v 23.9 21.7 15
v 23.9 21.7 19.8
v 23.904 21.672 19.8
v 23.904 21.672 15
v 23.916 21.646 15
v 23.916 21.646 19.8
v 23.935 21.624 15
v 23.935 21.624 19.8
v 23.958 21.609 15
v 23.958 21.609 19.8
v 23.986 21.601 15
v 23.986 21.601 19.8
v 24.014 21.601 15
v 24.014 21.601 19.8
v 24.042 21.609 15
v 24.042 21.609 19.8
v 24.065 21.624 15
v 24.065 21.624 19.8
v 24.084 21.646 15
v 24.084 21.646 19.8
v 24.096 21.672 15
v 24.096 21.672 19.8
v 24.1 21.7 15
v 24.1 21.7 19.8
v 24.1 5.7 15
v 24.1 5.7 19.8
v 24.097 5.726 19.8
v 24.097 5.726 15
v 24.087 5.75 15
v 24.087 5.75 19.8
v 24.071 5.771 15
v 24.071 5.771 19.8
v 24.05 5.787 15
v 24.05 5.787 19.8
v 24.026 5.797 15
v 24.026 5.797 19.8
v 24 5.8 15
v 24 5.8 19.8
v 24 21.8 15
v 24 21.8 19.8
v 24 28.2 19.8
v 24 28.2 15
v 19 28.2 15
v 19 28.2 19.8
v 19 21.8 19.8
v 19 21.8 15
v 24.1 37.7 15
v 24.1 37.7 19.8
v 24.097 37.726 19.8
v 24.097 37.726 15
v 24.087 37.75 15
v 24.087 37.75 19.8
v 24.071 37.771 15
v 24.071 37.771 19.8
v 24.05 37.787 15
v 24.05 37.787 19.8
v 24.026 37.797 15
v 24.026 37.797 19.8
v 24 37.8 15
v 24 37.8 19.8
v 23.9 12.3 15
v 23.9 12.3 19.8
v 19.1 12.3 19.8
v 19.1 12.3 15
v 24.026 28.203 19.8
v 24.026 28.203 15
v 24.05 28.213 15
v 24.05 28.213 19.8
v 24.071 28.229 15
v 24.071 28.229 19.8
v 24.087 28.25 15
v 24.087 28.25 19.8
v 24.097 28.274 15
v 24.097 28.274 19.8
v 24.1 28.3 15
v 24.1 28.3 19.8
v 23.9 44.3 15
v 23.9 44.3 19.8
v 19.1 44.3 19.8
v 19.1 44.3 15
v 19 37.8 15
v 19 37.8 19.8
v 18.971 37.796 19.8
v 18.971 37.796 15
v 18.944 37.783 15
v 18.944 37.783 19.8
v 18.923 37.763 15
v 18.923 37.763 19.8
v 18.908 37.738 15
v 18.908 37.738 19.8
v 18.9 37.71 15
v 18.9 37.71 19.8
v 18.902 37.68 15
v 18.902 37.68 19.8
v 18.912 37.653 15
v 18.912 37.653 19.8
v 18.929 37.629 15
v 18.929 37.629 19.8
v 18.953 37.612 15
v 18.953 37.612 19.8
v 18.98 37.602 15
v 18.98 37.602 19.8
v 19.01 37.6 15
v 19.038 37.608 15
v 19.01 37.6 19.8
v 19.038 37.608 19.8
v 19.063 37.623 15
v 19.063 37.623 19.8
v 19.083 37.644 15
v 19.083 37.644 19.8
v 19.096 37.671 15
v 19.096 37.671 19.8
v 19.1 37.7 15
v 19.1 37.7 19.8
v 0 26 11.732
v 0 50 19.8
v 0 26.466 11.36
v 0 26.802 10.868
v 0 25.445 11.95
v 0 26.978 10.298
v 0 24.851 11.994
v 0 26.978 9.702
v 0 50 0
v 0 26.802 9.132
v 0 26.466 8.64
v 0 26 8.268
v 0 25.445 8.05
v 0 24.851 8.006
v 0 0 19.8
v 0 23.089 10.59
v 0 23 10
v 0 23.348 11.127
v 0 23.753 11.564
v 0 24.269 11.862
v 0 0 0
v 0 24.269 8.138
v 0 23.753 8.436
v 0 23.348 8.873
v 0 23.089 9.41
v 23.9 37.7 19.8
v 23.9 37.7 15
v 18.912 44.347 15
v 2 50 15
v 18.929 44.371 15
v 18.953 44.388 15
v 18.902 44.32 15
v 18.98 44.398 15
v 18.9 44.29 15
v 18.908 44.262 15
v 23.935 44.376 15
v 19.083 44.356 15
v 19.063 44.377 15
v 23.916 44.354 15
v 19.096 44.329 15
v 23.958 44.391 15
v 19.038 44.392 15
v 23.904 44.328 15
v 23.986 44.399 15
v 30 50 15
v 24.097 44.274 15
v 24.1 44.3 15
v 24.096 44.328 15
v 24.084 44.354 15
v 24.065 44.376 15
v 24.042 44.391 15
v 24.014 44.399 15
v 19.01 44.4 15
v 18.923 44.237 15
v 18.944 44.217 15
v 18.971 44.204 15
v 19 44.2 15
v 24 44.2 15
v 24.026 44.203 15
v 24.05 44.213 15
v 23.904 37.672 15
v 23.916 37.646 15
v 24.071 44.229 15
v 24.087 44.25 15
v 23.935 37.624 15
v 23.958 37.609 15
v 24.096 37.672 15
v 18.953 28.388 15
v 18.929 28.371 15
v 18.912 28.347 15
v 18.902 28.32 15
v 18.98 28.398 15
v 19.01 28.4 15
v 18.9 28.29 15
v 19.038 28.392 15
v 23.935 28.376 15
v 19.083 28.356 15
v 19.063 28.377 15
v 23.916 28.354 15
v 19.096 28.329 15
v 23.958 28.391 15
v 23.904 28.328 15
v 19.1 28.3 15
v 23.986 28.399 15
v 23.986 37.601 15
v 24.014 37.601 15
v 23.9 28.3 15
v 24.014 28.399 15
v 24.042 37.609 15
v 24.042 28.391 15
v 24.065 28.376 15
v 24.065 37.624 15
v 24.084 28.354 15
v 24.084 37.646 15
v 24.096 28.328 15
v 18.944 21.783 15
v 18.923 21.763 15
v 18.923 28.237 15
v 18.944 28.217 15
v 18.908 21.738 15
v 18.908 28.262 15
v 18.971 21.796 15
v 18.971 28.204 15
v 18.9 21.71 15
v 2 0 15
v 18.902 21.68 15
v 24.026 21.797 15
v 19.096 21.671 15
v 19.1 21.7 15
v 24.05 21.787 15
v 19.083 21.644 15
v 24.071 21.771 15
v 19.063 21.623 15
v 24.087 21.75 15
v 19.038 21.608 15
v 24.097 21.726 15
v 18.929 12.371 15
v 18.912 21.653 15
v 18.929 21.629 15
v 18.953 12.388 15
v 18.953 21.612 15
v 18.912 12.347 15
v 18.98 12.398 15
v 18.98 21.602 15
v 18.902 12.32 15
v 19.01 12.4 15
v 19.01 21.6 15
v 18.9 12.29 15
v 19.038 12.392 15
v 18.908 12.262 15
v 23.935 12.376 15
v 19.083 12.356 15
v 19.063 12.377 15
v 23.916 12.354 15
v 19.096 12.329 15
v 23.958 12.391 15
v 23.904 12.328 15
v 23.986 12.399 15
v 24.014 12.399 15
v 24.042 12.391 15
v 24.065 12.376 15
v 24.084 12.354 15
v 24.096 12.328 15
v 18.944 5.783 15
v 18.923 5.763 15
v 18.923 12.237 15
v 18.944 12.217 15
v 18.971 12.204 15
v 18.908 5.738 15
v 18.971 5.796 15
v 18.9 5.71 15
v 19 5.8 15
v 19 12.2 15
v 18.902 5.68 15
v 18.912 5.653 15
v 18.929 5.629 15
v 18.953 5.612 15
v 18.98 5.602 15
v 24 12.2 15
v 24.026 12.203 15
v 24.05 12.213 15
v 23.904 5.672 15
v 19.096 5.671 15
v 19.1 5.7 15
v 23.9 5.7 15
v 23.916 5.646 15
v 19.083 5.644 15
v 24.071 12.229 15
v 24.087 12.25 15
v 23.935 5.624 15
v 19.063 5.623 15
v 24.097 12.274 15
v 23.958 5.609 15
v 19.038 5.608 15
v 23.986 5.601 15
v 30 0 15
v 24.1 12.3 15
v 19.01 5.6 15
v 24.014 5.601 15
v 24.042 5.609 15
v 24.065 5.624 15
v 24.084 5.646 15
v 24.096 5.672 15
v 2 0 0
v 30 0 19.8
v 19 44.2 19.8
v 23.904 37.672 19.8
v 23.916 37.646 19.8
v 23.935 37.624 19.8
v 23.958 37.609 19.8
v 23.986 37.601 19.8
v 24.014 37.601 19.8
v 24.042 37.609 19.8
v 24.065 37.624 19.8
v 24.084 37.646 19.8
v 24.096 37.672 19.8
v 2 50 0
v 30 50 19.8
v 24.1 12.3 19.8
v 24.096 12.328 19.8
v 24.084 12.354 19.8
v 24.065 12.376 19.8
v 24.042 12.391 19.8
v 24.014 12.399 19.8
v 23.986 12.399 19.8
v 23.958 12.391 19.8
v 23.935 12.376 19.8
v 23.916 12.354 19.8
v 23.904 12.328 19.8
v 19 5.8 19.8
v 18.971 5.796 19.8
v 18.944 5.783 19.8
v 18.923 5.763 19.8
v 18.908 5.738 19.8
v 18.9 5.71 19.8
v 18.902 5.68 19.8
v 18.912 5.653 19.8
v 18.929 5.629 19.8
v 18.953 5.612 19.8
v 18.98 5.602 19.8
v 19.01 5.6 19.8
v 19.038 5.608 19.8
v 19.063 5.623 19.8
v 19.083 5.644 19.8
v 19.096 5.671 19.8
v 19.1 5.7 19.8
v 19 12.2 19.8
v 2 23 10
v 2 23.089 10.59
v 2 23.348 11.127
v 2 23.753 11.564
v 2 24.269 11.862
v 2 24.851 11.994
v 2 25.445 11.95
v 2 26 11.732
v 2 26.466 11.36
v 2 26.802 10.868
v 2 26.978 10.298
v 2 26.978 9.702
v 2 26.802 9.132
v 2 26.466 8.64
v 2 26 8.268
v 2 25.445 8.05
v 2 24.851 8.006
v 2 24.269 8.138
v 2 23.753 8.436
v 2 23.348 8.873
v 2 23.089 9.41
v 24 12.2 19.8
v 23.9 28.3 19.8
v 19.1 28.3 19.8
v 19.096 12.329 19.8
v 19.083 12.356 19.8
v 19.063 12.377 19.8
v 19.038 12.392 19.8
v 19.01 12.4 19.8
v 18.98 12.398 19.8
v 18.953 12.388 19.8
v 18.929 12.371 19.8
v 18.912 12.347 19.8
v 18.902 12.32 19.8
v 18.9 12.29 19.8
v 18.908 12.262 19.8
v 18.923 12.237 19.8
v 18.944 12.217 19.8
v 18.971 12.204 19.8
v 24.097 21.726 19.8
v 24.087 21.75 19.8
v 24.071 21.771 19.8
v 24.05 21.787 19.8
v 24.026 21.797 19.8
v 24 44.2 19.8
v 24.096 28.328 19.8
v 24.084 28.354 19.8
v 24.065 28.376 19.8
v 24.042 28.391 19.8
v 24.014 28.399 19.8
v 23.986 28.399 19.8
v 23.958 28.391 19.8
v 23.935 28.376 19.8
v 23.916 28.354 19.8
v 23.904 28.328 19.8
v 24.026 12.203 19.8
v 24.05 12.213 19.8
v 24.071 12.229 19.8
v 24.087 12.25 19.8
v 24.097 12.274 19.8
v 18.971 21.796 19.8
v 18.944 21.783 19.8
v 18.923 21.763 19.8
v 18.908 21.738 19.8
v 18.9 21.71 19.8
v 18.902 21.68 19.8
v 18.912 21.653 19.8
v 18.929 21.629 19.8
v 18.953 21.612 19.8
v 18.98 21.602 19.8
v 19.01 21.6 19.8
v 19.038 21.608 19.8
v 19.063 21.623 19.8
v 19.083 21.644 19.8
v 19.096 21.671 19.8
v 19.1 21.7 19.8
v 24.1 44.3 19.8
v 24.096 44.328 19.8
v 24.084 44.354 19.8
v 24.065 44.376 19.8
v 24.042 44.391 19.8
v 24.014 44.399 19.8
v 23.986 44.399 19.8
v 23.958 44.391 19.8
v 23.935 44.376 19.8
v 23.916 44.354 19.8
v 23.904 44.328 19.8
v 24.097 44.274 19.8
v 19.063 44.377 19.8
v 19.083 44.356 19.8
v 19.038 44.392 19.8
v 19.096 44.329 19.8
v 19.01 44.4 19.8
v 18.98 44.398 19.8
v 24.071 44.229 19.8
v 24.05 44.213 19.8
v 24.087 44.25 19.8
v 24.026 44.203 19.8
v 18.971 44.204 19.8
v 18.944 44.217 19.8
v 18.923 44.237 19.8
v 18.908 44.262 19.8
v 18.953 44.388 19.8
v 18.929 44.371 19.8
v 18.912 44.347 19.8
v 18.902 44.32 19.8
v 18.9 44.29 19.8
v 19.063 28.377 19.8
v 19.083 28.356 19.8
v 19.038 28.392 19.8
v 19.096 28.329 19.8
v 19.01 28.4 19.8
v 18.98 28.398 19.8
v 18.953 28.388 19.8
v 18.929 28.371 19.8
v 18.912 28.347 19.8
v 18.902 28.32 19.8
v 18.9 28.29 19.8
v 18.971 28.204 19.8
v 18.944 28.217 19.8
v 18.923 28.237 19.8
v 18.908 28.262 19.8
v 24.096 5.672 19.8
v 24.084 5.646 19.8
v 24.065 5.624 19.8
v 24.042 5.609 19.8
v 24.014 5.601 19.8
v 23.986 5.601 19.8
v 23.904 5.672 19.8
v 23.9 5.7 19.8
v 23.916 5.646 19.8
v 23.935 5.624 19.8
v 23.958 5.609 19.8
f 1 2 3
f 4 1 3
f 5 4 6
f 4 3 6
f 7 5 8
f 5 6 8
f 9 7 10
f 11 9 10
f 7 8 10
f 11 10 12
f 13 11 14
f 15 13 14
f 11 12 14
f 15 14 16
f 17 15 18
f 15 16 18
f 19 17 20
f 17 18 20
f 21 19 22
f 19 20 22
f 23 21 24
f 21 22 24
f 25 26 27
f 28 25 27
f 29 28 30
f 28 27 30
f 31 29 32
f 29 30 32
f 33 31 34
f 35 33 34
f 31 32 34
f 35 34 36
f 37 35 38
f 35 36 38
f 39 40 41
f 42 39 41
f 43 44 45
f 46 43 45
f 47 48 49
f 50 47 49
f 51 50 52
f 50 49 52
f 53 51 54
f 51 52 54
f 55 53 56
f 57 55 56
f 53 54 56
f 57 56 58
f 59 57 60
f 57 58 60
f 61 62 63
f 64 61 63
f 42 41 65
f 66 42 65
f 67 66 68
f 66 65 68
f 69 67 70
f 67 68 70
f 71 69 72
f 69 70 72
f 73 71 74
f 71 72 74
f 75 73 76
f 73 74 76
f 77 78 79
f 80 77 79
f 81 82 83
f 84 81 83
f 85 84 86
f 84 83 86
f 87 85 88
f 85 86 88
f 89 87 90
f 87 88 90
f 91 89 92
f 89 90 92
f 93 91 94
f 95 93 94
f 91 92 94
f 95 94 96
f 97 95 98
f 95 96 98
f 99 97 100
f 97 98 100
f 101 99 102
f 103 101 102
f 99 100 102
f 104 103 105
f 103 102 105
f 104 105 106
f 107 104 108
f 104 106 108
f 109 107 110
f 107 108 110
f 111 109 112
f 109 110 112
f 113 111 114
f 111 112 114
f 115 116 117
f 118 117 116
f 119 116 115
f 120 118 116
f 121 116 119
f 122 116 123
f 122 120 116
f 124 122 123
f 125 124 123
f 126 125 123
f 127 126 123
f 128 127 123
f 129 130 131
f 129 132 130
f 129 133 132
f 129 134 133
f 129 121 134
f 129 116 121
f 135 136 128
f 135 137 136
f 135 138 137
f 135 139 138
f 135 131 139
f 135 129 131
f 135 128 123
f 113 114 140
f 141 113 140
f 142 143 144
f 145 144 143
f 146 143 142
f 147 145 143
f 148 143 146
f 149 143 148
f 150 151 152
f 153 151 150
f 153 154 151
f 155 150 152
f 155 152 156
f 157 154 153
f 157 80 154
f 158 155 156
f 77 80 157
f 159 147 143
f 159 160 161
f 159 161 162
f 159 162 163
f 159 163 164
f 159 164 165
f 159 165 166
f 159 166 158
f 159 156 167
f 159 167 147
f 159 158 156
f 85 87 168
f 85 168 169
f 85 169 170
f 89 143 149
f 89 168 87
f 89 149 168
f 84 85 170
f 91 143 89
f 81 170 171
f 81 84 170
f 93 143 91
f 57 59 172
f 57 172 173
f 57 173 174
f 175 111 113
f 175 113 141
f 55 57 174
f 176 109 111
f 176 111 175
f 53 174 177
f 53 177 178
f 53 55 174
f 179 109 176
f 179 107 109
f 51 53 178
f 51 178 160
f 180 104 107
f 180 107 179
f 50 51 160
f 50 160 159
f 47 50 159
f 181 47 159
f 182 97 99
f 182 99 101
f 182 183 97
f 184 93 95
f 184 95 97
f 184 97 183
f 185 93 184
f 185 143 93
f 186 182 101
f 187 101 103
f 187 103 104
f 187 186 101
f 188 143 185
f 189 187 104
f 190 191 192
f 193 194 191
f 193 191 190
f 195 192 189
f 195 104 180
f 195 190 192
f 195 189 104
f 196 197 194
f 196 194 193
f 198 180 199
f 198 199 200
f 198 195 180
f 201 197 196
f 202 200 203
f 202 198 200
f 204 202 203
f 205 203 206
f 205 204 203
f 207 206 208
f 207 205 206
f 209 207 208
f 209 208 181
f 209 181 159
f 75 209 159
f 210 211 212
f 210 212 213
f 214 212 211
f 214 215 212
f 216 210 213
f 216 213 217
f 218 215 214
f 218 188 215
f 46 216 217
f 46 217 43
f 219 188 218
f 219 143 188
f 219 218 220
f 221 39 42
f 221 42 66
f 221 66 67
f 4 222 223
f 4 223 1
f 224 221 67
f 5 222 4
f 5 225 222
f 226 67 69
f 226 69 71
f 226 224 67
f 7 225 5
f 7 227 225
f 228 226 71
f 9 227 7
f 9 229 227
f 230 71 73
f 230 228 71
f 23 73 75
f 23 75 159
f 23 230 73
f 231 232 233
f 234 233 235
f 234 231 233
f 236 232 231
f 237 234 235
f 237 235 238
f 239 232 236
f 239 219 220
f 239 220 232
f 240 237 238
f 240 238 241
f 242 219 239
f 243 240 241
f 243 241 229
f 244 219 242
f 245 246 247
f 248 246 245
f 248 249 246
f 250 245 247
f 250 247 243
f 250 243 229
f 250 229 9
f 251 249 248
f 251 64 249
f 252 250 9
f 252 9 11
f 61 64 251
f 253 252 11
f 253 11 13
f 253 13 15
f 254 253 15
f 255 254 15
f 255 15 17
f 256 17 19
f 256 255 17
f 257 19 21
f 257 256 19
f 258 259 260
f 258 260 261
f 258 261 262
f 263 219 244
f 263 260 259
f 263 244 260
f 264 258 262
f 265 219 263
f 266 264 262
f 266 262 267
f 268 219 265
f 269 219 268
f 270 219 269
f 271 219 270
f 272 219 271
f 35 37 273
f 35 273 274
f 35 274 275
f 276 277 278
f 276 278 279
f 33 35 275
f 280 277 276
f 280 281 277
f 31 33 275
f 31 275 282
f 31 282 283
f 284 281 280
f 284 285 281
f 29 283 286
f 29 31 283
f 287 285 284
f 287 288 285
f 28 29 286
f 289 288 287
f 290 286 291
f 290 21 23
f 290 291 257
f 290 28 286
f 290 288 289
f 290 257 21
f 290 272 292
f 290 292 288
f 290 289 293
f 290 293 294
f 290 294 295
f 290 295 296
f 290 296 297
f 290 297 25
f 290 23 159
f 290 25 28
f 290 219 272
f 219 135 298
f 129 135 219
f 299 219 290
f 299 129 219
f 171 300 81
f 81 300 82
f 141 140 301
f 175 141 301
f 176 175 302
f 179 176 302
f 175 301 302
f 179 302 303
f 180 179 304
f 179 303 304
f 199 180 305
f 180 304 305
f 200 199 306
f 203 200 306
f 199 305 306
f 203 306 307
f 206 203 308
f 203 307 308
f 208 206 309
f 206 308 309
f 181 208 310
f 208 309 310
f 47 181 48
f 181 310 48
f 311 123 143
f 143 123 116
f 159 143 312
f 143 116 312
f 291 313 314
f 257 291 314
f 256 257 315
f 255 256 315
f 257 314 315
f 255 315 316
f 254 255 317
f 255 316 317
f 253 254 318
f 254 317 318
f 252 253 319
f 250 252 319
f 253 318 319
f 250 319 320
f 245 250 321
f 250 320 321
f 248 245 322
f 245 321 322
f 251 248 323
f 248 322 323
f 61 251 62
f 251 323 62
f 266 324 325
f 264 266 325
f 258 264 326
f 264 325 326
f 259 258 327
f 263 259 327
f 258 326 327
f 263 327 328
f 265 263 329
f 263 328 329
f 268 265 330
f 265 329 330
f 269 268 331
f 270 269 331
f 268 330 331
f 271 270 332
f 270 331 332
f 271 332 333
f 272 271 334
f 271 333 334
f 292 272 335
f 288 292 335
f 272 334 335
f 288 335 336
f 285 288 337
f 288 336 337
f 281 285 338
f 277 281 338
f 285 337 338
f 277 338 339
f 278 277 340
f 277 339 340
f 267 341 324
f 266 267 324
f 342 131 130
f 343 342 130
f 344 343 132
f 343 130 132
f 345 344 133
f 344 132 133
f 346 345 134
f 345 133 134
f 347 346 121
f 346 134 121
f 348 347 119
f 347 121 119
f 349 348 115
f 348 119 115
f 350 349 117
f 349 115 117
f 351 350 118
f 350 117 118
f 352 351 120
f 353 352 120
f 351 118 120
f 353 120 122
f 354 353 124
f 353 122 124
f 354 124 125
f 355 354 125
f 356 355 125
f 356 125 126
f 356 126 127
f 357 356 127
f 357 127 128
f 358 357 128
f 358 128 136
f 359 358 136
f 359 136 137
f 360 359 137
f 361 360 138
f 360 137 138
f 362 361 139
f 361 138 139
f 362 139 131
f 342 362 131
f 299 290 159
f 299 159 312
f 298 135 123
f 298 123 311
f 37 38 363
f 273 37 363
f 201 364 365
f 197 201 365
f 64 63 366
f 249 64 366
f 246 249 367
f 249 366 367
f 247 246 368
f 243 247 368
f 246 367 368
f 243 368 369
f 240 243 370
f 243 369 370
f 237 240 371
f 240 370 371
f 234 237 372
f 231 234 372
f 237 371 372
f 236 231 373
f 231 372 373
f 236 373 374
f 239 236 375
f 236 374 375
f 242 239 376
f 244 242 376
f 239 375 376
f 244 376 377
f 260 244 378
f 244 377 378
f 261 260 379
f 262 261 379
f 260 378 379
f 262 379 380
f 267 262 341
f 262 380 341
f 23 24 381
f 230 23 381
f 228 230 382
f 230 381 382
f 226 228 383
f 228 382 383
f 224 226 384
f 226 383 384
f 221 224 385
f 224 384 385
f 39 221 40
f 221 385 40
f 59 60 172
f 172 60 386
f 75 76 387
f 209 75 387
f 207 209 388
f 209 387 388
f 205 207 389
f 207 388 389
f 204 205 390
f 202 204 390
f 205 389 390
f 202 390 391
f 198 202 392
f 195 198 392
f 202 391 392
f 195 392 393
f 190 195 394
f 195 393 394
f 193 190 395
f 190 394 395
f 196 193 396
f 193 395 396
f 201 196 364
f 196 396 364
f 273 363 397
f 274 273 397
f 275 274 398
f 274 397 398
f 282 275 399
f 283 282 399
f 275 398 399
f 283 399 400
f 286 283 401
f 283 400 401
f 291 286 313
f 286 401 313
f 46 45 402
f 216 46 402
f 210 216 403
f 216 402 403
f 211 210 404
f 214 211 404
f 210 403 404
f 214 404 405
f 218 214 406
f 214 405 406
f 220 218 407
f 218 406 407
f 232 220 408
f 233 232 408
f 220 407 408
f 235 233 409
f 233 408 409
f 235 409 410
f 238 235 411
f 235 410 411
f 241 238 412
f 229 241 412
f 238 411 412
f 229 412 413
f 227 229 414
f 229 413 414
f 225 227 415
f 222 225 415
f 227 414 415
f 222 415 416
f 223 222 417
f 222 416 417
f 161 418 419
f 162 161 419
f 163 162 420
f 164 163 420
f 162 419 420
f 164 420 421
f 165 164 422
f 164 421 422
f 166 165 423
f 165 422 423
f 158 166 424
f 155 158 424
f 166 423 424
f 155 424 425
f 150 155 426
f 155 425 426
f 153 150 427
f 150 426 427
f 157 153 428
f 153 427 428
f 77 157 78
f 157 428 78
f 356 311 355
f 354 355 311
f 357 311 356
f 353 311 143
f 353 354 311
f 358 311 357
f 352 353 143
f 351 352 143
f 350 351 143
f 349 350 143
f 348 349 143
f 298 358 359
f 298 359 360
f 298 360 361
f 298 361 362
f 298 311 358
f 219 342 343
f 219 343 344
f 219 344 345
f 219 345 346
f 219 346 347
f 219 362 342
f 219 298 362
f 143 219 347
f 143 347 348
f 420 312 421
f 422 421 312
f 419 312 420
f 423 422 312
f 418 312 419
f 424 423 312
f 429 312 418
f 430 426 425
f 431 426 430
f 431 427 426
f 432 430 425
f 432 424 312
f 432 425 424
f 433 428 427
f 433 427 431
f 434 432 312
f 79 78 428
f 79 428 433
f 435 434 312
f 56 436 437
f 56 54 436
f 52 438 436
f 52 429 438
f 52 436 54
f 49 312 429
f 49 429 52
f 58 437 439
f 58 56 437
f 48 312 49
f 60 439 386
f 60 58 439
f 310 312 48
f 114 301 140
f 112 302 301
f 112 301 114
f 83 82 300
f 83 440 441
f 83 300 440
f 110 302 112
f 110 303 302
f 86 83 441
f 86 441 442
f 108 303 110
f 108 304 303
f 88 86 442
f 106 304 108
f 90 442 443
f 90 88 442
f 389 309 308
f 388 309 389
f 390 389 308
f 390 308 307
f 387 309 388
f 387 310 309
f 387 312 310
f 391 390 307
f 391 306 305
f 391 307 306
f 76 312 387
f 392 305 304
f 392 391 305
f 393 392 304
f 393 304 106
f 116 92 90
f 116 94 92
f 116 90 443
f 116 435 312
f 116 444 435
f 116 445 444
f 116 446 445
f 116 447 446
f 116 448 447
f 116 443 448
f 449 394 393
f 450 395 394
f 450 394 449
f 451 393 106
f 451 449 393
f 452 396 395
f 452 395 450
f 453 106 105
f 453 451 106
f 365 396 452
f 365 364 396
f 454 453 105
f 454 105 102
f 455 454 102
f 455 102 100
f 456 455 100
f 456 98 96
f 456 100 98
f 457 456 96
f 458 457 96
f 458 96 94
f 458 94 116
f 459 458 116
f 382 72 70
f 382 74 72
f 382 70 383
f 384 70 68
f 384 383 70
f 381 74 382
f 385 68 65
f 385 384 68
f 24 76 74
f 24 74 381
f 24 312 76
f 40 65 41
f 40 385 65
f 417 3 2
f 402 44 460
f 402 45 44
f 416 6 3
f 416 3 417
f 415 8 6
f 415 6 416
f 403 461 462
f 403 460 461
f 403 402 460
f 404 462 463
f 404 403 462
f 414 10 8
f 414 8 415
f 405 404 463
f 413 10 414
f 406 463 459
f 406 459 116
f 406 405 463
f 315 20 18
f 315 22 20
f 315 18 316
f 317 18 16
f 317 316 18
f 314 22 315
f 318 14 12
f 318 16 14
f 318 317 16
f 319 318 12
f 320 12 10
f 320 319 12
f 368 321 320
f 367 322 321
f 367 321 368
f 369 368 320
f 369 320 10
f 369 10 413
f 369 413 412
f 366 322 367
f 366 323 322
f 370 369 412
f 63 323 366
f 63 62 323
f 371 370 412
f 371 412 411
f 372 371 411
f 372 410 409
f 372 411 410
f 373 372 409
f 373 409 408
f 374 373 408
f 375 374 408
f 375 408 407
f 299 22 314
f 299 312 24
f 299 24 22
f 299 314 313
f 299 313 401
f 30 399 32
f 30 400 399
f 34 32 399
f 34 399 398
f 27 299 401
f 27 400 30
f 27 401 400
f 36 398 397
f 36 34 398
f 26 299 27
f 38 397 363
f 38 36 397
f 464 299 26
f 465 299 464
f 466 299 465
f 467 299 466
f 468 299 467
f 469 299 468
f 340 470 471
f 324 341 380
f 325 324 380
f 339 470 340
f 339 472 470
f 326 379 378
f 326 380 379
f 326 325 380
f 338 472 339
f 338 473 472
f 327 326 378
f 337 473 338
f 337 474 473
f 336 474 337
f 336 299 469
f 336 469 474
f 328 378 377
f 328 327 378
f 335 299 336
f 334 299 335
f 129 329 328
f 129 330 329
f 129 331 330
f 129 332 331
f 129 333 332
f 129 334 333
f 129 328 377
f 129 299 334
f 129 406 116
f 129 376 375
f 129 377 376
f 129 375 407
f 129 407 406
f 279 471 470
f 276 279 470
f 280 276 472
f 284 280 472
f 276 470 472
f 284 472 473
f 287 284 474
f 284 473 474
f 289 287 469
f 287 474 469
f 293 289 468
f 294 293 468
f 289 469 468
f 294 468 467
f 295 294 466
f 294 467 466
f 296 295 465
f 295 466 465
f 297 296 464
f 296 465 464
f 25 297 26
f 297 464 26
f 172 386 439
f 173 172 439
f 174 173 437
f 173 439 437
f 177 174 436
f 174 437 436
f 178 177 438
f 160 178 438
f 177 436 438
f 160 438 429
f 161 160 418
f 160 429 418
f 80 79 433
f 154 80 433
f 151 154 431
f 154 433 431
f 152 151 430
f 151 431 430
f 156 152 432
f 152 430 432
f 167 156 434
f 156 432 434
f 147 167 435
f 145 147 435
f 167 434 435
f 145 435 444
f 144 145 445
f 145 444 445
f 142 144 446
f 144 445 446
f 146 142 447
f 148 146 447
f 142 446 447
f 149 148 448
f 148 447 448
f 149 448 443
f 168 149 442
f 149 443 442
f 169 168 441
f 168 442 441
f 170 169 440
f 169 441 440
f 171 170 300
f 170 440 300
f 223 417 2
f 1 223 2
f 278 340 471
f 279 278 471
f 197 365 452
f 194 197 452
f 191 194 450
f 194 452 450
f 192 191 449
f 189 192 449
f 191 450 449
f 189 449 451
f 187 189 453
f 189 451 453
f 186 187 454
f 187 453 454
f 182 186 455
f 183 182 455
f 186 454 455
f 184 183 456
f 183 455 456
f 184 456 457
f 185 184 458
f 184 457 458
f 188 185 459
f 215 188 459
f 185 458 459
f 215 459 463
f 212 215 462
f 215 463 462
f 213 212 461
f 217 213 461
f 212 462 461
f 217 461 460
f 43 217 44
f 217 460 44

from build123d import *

# Parameters (mm, degrees)
F2_DEPTH = 50
F4_R     = 2
F5_DEPTH = 2
F6_DEPTH = 4.8


with BuildPart() as f2:
    # F1 (on Front) → F2 (new body)
    with BuildSketch(Plane.XZ):
        Polygon((0, 19.8), (0, 0), (2, 0), (2, 15), (30, 15), (30, 19.8), align=None)
    extrude(amount=-F2_DEPTH)

    # F4 (on face) → F5 (cut, through all)
    with BuildSketch(Plane(origin=(0, 0, 0), x_dir=(0, -1, 0), z_dir=(-1, 0, 0))):
        with Locations((-25, 10)):
            Circle(F4_R)
    extrude(amount=-F5_DEPTH, mode=Mode.SUBTRACT)

    # F3 (on face) → F6 (cut, through all)
    with BuildSketch(Plane.XY.offset(19.8)):
        with BuildLine():
            ThreePointArc((19, 21.8), (18.9292893219, 21.6292893219), (19.1, 21.7))
            Line((19.1, 21.7), (19, 21.7))
            Line((19, 21.7), (19, 21.8))
        make_face()
        with BuildLine():
            ThreePointArc((19, 21.8), (19.0707106781, 21.7707106781), (19.1, 21.7))
            Line((19.1, 21.7), (23.9, 21.7))
            ThreePointArc((23.9, 21.7), (23.9292893219, 21.7707106781), (24, 21.8))
            Line((24, 21.8), (24, 28.2))
            ThreePointArc((24, 28.2), (23.9292893219, 28.2292893219), (23.9, 28.3))
            Line((23.9, 28.3), (19.1, 28.3))
            ThreePointArc((19.1, 28.3), (19.0707106781, 28.2292893219), (19, 28.2))
            Line((19, 28.2), (19, 21.8))
        make_face()
        with BuildLine():
            Line((19, 21.7), (19.1, 21.7))
            ThreePointArc((19.1, 21.7), (19.0707106781, 21.7707106781), (19, 21.8))
            Line((19, 21.8), (19, 21.7))
        make_face()
        with BuildLine():
            ThreePointArc((24, 21.8), (23.9292893219, 21.7707106781), (23.9, 21.7))
            Line((23.9, 21.7), (24, 21.7))
            Line((24, 21.7), (24, 21.8))
        make_face()
        with BuildLine():
            Line((24, 21.7), (23.9, 21.7))
            ThreePointArc((23.9, 21.7), (24, 21.6), (24.1, 21.7))
            ThreePointArc((24.1, 21.7), (24.0707106781, 21.7707106781), (24, 21.8))
            Line((24, 21.8), (24, 21.7))
        make_face()
        with BuildLine():
            ThreePointArc((19.1, 28.3), (18.9292893219, 28.3707106781), (19, 28.2))
            Line((19, 28.2), (19, 28.3))
            Line((19, 28.3), (19.1, 28.3))
        make_face()
        with BuildLine():
            Line((19, 28.3), (19, 28.2))
            ThreePointArc((19, 28.2), (19.0707106781, 28.2292893219), (19.1, 28.3))
            Line((19.1, 28.3), (19, 28.3))
        make_face()
        with BuildLine():
            ThreePointArc((23.9, 28.3), (23.9292893219, 28.2292893219), (24, 28.2))
            Line((24, 28.2), (24, 28.3))
            Line((24, 28.3), (23.9, 28.3))
        make_face()
        with BuildLine():
            Line((24, 28.3), (24, 28.2))
            ThreePointArc((24, 28.2), (24.0707106781, 28.2292893219), (24.1, 28.3))
            ThreePointArc((24.1, 28.3), (24, 28.4), (23.9, 28.3))
            Line((23.9, 28.3), (24, 28.3))
        make_face()
        with BuildLine():
            ThreePointArc((19, 37.8), (18.9292893219, 37.6292893219), (19.1, 37.7))
            Line((19.1, 37.7), (19, 37.7))
            Line((19, 37.7), (19, 37.8))
        make_face()
        with BuildLine():
            ThreePointArc((19, 37.8), (19.0707106781, 37.7707106781), (19.1, 37.7))
            Line((19.1, 37.7), (23.9, 37.7))
            ThreePointArc((23.9, 37.7), (23.9292893219, 37.7707106781), (24, 37.8))
            Line((24, 37.8), (24, 44.2))
            ThreePointArc((24, 44.2), (23.9292893219, 44.2292893219), (23.9, 44.3))
            Line((23.9, 44.3), (19.1, 44.3))
            ThreePointArc((19.1, 44.3), (19.0707106781, 44.2292893219), (19, 44.2))
            Line((19, 44.2), (19, 37.8))
        make_face()
        with BuildLine():
            Line((19, 37.7), (19.1, 37.7))
            ThreePointArc((19.1, 37.7), (19.0707106781, 37.7707106781), (19, 37.8))
            Line((19, 37.8), (19, 37.7))
        make_face()
        with BuildLine():
            ThreePointArc((24, 37.8), (23.9292893219, 37.7707106781), (23.9, 37.7))
            Line((23.9, 37.7), (24, 37.7))
            Line((24, 37.7), (24, 37.8))
        make_face()
        with BuildLine():
            Line((24, 37.7), (23.9, 37.7))
            ThreePointArc((23.9, 37.7), (24, 37.6), (24.1, 37.7))
            ThreePointArc((24.1, 37.7), (24.0707106781, 37.7707106781), (24, 37.8))
            Line((24, 37.8), (24, 37.7))
        make_face()
        with BuildLine():
            ThreePointArc((19.1, 44.3), (18.9292893219, 44.3707106781), (19, 44.2))
            Line((19, 44.2), (19, 44.3))
            Line((19, 44.3), (19.1, 44.3))
        make_face()
        with BuildLine():
            Line((19, 44.3), (19, 44.2))
            ThreePointArc((19, 44.2), (19.0707106781, 44.2292893219), (19.1, 44.3))
            Line((19.1, 44.3), (19, 44.3))
        make_face()
        with BuildLine():
            Line((24, 44.3), (24, 44.2))
            ThreePointArc((24, 44.2), (24.0707106781, 44.2292893219), (24.1, 44.3))
            ThreePointArc((24.1, 44.3), (24, 44.4), (23.9, 44.3))
            Line((23.9, 44.3), (24, 44.3))
        make_face()
        with BuildLine():
            ThreePointArc((23.9, 44.3), (23.9292893219, 44.2292893219), (24, 44.2))
            Line((24, 44.2), (24, 44.3))
            Line((24, 44.3), (23.9, 44.3))
        make_face()
        with BuildLine():
            ThreePointArc((19, 12.2), (19.0707106781, 12.2292893219), (19.1, 12.3))
            Line((19.1, 12.3), (19, 12.3))
            Line((19, 12.3), (19, 12.2))
        make_face()
        with BuildLine():
            Line((19, 12.3), (19.1, 12.3))
            ThreePointArc((19.1, 12.3), (18.9292893219, 12.3707106781), (19, 12.2))
            Line((19, 12.2), (19, 12.3))
        make_face()
        with BuildLine():
            Line((23.9, 12.3), (19.1, 12.3))
            ThreePointArc((19.1, 12.3), (19.0707106781, 12.2292893219), (19, 12.2))
            Line((19, 12.2), (19, 5.8))
            ThreePointArc((19, 5.8), (19.0707106781, 5.7707106781), (19.1, 5.7))
            Line((19.1, 5.7), (23.9, 5.7))
            ThreePointArc((23.9, 5.7), (23.9292893219, 5.7707106781), (24, 5.8))
            Line((24, 5.8), (24, 12.2))
            ThreePointArc((24, 12.2), (23.9292893219, 12.2292893219), (23.9, 12.3))
        make_face()
        with BuildLine():
            ThreePointArc((24.1, 12.3), (24, 12.4), (23.9, 12.3))
            Line((23.9, 12.3), (24, 12.3))
            Line((24, 12.3), (24, 12.2))
            ThreePointArc((24, 12.2), (24.0707106781, 12.2292893219), (24.1, 12.3))
        make_face()
        with BuildLine():
            Line((24, 12.3), (23.9, 12.3))
            ThreePointArc((23.9, 12.3), (23.9292893219, 12.2292893219), (24, 12.2))
            Line((24, 12.2), (24, 12.3))
        make_face()
        with BuildLine():
            ThreePointArc((19.1, 5.7), (19.0707106781, 5.7707106781), (19, 5.8))
            Line((19, 5.8), (19, 5.7))
            Line((19, 5.7), (19.1, 5.7))
        make_face()
        with BuildLine():
            Line((19, 5.7), (19, 5.8))
            ThreePointArc((19, 5.8), (18.9292893219, 5.6292893219), (19.1, 5.7))
            Line((19.1, 5.7), (19, 5.7))
        make_face()
        with BuildLine():
            Line((24, 5.7), (24, 5.8))
            ThreePointArc((24, 5.8), (23.9292893219, 5.7707106781), (23.9, 5.7))
            Line((23.9, 5.7), (24, 5.7))
        make_face()
        with BuildLine():
            ThreePointArc((24.1, 5.7), (24.0707106781, 5.7707106781), (24, 5.8))
            Line((24, 5.8), (24, 5.7))
            Line((24, 5.7), (23.9, 5.7))
            ThreePointArc((23.9, 5.7), (24, 5.6), (24.1, 5.7))
        make_face()
    extrude(amount=-F6_DEPTH, mode=Mode.SUBTRACT)


solid = f2.part
